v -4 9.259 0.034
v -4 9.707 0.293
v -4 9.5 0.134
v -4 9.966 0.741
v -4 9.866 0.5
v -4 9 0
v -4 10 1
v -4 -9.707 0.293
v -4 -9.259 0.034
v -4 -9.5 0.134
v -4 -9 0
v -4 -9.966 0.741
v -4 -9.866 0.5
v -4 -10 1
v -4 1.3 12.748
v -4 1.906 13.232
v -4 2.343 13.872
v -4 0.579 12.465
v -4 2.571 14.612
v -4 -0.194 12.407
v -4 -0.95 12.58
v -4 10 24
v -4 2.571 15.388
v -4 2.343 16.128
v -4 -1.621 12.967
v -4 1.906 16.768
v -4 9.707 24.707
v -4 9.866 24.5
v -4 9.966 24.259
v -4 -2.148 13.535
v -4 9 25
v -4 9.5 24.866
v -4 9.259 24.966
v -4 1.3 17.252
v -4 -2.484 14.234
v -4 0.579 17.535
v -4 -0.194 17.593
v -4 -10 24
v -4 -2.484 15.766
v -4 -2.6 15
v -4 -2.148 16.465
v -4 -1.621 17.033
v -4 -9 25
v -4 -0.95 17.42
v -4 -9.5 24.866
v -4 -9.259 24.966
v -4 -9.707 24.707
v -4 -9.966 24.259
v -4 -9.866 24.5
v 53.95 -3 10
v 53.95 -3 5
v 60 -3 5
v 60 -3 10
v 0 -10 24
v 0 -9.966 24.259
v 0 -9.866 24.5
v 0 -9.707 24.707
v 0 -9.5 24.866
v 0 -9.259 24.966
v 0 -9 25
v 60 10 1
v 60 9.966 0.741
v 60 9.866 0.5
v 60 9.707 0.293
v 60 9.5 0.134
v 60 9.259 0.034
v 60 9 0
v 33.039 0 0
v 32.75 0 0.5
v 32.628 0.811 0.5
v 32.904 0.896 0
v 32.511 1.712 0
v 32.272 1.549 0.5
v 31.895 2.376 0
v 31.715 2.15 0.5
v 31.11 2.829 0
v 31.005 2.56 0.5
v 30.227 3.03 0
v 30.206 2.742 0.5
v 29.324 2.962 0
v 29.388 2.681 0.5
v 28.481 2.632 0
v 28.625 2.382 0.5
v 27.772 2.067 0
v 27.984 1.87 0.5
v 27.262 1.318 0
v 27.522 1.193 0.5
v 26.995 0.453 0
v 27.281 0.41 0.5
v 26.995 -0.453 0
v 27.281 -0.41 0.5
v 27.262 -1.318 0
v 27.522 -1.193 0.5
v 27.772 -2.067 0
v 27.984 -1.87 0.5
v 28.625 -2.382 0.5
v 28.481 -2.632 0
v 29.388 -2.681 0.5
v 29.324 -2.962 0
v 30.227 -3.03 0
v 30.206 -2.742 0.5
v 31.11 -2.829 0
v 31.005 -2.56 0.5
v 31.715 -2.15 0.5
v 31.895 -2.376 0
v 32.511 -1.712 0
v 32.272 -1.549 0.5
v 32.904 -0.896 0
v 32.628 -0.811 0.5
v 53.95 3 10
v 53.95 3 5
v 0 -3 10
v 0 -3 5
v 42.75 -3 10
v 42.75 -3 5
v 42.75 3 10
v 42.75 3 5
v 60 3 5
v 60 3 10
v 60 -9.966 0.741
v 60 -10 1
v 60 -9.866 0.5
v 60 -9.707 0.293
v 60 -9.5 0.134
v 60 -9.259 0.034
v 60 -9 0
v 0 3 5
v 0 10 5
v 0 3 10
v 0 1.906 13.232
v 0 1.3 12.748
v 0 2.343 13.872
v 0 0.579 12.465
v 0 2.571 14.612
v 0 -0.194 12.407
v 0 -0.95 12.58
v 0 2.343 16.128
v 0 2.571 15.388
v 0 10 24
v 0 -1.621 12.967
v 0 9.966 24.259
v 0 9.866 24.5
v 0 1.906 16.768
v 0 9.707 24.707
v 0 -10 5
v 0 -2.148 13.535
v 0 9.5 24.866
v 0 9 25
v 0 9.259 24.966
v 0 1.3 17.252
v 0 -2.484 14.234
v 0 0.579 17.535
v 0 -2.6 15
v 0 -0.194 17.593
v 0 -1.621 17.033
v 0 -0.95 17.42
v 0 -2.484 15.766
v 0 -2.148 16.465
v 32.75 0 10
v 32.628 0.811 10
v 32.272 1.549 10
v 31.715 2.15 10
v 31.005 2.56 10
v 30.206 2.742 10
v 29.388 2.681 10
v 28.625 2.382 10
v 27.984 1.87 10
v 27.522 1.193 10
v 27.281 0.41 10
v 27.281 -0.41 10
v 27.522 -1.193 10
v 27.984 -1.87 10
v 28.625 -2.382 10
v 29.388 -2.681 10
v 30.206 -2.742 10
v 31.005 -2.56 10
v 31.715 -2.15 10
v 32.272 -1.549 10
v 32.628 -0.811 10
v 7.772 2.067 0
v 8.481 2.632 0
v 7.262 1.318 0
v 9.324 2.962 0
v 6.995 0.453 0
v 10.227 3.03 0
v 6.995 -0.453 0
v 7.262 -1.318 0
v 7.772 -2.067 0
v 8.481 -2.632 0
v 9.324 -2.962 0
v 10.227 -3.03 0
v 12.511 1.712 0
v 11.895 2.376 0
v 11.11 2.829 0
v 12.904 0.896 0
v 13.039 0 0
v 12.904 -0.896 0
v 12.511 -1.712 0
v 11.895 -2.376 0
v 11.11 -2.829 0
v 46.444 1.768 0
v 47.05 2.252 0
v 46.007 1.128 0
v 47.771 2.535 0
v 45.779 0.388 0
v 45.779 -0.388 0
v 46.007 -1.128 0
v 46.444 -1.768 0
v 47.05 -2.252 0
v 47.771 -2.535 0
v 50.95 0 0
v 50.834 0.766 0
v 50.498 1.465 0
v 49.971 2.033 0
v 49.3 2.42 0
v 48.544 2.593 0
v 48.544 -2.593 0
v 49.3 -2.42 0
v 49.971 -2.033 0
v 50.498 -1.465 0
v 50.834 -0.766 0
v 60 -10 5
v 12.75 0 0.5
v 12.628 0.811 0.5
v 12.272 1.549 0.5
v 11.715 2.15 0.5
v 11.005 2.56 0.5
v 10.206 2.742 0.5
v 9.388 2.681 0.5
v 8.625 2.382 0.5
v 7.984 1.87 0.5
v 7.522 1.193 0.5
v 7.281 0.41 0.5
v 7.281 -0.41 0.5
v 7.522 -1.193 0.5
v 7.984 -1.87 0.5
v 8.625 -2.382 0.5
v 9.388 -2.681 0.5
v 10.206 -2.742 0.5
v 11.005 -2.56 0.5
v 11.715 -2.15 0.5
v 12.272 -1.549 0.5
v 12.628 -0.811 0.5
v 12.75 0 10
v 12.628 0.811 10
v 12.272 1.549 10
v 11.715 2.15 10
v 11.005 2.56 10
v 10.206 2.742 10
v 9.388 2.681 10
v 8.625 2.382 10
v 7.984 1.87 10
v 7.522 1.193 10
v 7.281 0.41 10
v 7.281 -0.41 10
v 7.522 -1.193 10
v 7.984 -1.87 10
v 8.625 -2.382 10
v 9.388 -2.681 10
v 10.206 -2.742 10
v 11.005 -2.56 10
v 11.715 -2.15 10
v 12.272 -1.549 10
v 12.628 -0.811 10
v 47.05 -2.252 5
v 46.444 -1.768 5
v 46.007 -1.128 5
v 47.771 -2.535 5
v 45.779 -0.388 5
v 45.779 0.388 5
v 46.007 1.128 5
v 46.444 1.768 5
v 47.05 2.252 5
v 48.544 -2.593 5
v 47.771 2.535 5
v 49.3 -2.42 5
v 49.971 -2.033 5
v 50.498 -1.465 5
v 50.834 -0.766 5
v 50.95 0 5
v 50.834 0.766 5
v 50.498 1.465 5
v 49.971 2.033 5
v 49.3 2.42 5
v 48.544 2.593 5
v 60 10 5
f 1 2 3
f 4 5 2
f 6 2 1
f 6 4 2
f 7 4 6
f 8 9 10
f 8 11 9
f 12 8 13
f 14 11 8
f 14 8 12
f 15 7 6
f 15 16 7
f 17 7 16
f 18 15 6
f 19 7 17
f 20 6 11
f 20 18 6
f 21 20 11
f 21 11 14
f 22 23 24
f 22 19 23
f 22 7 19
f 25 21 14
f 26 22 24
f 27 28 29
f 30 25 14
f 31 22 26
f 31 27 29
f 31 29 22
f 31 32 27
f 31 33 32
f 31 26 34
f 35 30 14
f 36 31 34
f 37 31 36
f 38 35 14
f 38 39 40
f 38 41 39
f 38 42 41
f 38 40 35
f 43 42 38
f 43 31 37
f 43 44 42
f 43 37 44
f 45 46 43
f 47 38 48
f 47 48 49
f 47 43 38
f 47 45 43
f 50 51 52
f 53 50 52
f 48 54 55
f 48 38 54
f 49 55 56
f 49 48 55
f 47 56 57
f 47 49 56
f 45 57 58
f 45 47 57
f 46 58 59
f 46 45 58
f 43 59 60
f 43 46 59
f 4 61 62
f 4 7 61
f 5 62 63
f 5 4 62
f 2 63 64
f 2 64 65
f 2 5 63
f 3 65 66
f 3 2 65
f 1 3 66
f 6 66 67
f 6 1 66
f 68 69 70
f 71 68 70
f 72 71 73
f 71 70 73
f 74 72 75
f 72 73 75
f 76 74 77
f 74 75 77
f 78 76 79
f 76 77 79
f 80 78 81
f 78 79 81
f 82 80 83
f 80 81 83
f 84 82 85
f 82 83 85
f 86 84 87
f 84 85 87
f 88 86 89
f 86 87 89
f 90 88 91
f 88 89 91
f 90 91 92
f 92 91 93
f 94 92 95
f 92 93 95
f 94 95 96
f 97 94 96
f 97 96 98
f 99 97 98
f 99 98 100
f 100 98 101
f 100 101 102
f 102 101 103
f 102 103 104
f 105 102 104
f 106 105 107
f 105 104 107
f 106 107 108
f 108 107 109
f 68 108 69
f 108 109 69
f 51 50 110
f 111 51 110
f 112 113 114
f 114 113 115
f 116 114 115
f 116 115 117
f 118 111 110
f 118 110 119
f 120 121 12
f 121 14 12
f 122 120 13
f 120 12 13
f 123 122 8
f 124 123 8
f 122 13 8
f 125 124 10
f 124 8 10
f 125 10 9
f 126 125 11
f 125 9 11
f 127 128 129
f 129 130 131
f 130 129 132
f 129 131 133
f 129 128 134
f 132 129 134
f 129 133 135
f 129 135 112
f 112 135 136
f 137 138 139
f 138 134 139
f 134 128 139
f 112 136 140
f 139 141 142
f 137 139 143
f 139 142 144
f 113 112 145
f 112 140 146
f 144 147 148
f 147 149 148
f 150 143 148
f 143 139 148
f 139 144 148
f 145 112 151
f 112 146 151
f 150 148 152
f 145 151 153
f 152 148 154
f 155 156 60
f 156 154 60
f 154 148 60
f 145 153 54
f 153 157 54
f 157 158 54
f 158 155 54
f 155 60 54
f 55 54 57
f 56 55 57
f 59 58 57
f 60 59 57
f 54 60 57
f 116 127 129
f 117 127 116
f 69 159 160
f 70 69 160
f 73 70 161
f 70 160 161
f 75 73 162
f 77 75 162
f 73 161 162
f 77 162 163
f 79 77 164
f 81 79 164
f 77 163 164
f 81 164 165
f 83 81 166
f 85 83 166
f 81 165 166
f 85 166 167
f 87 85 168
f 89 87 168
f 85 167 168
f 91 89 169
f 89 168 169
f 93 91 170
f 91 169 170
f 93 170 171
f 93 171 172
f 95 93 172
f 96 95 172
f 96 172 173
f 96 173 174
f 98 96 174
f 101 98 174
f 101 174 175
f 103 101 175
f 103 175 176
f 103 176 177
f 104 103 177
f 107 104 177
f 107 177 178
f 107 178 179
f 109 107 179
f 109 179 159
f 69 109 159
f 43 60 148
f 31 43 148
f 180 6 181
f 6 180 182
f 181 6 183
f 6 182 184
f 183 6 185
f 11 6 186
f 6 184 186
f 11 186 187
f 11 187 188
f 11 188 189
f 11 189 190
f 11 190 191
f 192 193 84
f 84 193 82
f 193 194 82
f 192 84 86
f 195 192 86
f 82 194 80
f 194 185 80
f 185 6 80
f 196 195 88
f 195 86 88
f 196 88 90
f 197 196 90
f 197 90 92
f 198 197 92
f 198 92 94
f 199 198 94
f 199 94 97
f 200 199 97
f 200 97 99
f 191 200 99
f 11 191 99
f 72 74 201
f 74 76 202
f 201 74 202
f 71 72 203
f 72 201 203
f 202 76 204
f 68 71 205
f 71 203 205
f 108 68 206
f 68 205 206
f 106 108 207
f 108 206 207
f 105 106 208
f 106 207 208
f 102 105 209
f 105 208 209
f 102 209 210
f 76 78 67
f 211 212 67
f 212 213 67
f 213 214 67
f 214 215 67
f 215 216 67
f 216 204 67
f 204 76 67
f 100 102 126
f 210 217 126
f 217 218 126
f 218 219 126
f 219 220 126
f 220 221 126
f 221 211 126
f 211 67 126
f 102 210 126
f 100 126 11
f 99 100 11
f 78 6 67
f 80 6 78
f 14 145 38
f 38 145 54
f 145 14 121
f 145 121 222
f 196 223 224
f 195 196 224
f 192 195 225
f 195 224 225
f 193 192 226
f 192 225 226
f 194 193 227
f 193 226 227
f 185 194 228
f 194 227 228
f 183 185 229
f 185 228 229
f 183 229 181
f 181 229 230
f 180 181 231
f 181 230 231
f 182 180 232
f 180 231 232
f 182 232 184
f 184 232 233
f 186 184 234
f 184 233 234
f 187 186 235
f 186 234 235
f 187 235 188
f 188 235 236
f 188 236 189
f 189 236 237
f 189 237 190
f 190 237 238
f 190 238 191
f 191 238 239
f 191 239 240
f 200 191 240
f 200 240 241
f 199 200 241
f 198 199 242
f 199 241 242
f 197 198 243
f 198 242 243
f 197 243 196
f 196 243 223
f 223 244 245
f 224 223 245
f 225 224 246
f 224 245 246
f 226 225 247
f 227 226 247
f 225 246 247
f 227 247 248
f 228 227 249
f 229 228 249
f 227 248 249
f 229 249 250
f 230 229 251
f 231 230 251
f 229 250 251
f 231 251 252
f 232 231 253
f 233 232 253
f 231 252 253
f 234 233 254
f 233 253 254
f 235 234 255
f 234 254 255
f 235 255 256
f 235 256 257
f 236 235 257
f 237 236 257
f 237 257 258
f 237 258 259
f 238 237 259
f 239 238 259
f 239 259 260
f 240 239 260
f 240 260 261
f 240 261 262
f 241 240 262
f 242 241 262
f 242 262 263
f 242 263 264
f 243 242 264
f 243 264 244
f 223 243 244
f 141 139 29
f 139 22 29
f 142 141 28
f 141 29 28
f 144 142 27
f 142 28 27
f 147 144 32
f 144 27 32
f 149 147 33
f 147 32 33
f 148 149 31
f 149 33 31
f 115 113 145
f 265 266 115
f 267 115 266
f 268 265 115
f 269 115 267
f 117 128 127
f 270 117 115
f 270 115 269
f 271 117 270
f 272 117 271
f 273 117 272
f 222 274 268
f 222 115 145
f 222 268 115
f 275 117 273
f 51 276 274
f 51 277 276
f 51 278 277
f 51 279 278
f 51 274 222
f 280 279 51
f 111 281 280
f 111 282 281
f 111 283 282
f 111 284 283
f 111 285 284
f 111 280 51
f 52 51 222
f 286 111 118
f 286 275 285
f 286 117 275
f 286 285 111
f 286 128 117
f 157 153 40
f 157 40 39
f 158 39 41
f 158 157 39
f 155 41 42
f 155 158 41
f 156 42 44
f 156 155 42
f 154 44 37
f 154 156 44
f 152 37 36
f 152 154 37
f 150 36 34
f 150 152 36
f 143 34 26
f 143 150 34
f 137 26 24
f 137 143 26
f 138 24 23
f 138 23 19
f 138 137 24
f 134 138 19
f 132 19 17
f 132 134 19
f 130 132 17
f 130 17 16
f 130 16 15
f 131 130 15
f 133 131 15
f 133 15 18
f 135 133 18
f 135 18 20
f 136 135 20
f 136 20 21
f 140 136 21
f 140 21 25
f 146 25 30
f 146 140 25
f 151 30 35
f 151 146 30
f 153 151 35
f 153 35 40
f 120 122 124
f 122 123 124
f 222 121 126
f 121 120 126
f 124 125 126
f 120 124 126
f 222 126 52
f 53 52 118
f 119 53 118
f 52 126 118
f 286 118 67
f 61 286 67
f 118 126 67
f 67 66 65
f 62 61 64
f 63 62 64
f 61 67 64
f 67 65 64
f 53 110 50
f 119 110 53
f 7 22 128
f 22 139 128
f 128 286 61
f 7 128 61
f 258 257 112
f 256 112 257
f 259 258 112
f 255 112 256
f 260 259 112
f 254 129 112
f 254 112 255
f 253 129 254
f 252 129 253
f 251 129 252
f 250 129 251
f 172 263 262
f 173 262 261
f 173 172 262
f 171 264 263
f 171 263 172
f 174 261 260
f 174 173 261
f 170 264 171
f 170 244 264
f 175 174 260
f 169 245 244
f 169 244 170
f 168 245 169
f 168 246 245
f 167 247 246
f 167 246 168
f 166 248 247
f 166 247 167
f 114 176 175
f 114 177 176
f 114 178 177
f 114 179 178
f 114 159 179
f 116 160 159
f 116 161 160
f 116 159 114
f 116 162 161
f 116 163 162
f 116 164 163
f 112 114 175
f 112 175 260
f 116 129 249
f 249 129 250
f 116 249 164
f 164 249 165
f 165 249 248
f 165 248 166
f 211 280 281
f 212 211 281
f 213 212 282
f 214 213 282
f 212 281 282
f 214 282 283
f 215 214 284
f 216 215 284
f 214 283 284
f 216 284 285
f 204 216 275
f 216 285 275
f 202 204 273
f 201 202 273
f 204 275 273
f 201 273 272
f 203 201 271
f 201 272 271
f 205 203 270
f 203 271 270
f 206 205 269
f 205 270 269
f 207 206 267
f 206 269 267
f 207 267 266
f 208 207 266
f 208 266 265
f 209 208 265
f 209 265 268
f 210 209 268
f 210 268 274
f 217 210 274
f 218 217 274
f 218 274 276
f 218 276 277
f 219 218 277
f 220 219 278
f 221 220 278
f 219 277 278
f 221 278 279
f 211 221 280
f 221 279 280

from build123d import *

# Parameters (mm, degrees)
F0_W         = 60
F0_H         = 20
F1_DEPTH     = 5
F2_W         = 60
F2_H         = 6
F3_DEPTH     = 5
F4_R         = 2.75
F5_DEPTH     = 25
F6_W         = 11.2
F6_H         = 6
F7_DEPTH     = 5
F8_R         = 2.6
F9_DEPTH     = 5
F10_R        = 2.6
F11_DEPTH    = 4
F12_R        = 1
F13_C1_SIZE2 = 0.5
F13_C1_SIZE  = 0.2886751346
F13_C2_SIZE2 = 0.5
F13_C2_SIZE  = 0.2886751346


# Not quite as in the source:
# - a feature names something its author has since deleted; it is built from what else it names


with BuildPart() as f1:
    # F0 (on Top) → F1 (new body)
    with BuildSketch(Plane.XY):
        with Locations((30, 0)):
            Rectangle(F0_W, F0_H)
    extrude(amount=F1_DEPTH)

    # F2 (on face) → F3 (join)
    with BuildSketch(Plane.XY.offset(5)):
        with Locations((30, 0)):
            Rectangle(F2_W, F2_H)
    extrude(amount=F3_DEPTH)

    # F4 (on face) → F5 (cut)
    with BuildSketch(Plane.XY.offset(10)):
        with Locations((30, 0)):
            Circle(F4_R)
        with Locations((10, 0)):
            Circle(F4_R)
    extrude(amount=-F5_DEPTH, mode=Mode.SUBTRACT)

    # F6 (on face) → F7 (cut, through all)
    with BuildSketch(Plane.XY.offset(10)):
        with Locations((48.35, 0)):
            Rectangle(F6_W, F6_H)
    extrude(amount=-F7_DEPTH, mode=Mode.SUBTRACT)

    # F8 (on face) → F9 (cut, through all)
    with BuildSketch(Plane.XY.offset(5)):
        with Locations((48.35, 0)):
            Circle(F8_R)
    extrude(amount=-F9_DEPTH, mode=Mode.SUBTRACT)

    # F10 (on face) → F11 (join)
    with BuildSketch(Plane(origin=(0, 0, 0), x_dir=(0, -1, 0), z_dir=(-1, 0, 0))):
        Polygon((-10, 25), (-10, 5), (-3, 5), (-3, 10), (3, 10), (3, 5), (10, 5), (10, 25), align=None)
        with Locations((0, 15)):
            Circle(F10_R, mode=Mode.SUBTRACT)
        Polygon((-10, 5), (-10, 0), (10, 0), (10, 5), (3, 5), (3, 10), (-3, 10), (-3, 5), align=None)
    extrude(amount=F11_DEPTH)

    # F12
    f12_edges = [f1.edges().sort_by_distance(p)[0] for p in [
        (-2, -10, 25),
        (-2, 10, 25),
        (28, -10, 0),
        (28, 10, 0),
    ]]
    fillet(f12_edges, radius=F12_R)

    # F13: chamfer of 0.5 x 0.2886751346 on 2 edges, made by hand

    # F13_c1
    f13_c1_edges = [f1.edges().sort_by_distance(p)[0] for p in [
        (7.25, 0, 0),
    ]]
    f13_c1_side = f1.faces().sort_by_distance((7.2442264973, 0, 0))[0]
    chamfer(f13_c1_edges, length=F13_C1_SIZE, length2=F13_C1_SIZE2, reference=f13_c1_side)

    # F13_c2
    f13_c2_edges = [f1.edges().sort_by_distance(p)[0] for p in [
        (27.25, 0, 0),
    ]]
    f13_c2_side = f1.faces().sort_by_distance((27.2442264973, 0, 0))[0]
    chamfer(f13_c2_edges, length=F13_C2_SIZE, length2=F13_C2_SIZE2, reference=f13_c2_side)


solid = f1.part
